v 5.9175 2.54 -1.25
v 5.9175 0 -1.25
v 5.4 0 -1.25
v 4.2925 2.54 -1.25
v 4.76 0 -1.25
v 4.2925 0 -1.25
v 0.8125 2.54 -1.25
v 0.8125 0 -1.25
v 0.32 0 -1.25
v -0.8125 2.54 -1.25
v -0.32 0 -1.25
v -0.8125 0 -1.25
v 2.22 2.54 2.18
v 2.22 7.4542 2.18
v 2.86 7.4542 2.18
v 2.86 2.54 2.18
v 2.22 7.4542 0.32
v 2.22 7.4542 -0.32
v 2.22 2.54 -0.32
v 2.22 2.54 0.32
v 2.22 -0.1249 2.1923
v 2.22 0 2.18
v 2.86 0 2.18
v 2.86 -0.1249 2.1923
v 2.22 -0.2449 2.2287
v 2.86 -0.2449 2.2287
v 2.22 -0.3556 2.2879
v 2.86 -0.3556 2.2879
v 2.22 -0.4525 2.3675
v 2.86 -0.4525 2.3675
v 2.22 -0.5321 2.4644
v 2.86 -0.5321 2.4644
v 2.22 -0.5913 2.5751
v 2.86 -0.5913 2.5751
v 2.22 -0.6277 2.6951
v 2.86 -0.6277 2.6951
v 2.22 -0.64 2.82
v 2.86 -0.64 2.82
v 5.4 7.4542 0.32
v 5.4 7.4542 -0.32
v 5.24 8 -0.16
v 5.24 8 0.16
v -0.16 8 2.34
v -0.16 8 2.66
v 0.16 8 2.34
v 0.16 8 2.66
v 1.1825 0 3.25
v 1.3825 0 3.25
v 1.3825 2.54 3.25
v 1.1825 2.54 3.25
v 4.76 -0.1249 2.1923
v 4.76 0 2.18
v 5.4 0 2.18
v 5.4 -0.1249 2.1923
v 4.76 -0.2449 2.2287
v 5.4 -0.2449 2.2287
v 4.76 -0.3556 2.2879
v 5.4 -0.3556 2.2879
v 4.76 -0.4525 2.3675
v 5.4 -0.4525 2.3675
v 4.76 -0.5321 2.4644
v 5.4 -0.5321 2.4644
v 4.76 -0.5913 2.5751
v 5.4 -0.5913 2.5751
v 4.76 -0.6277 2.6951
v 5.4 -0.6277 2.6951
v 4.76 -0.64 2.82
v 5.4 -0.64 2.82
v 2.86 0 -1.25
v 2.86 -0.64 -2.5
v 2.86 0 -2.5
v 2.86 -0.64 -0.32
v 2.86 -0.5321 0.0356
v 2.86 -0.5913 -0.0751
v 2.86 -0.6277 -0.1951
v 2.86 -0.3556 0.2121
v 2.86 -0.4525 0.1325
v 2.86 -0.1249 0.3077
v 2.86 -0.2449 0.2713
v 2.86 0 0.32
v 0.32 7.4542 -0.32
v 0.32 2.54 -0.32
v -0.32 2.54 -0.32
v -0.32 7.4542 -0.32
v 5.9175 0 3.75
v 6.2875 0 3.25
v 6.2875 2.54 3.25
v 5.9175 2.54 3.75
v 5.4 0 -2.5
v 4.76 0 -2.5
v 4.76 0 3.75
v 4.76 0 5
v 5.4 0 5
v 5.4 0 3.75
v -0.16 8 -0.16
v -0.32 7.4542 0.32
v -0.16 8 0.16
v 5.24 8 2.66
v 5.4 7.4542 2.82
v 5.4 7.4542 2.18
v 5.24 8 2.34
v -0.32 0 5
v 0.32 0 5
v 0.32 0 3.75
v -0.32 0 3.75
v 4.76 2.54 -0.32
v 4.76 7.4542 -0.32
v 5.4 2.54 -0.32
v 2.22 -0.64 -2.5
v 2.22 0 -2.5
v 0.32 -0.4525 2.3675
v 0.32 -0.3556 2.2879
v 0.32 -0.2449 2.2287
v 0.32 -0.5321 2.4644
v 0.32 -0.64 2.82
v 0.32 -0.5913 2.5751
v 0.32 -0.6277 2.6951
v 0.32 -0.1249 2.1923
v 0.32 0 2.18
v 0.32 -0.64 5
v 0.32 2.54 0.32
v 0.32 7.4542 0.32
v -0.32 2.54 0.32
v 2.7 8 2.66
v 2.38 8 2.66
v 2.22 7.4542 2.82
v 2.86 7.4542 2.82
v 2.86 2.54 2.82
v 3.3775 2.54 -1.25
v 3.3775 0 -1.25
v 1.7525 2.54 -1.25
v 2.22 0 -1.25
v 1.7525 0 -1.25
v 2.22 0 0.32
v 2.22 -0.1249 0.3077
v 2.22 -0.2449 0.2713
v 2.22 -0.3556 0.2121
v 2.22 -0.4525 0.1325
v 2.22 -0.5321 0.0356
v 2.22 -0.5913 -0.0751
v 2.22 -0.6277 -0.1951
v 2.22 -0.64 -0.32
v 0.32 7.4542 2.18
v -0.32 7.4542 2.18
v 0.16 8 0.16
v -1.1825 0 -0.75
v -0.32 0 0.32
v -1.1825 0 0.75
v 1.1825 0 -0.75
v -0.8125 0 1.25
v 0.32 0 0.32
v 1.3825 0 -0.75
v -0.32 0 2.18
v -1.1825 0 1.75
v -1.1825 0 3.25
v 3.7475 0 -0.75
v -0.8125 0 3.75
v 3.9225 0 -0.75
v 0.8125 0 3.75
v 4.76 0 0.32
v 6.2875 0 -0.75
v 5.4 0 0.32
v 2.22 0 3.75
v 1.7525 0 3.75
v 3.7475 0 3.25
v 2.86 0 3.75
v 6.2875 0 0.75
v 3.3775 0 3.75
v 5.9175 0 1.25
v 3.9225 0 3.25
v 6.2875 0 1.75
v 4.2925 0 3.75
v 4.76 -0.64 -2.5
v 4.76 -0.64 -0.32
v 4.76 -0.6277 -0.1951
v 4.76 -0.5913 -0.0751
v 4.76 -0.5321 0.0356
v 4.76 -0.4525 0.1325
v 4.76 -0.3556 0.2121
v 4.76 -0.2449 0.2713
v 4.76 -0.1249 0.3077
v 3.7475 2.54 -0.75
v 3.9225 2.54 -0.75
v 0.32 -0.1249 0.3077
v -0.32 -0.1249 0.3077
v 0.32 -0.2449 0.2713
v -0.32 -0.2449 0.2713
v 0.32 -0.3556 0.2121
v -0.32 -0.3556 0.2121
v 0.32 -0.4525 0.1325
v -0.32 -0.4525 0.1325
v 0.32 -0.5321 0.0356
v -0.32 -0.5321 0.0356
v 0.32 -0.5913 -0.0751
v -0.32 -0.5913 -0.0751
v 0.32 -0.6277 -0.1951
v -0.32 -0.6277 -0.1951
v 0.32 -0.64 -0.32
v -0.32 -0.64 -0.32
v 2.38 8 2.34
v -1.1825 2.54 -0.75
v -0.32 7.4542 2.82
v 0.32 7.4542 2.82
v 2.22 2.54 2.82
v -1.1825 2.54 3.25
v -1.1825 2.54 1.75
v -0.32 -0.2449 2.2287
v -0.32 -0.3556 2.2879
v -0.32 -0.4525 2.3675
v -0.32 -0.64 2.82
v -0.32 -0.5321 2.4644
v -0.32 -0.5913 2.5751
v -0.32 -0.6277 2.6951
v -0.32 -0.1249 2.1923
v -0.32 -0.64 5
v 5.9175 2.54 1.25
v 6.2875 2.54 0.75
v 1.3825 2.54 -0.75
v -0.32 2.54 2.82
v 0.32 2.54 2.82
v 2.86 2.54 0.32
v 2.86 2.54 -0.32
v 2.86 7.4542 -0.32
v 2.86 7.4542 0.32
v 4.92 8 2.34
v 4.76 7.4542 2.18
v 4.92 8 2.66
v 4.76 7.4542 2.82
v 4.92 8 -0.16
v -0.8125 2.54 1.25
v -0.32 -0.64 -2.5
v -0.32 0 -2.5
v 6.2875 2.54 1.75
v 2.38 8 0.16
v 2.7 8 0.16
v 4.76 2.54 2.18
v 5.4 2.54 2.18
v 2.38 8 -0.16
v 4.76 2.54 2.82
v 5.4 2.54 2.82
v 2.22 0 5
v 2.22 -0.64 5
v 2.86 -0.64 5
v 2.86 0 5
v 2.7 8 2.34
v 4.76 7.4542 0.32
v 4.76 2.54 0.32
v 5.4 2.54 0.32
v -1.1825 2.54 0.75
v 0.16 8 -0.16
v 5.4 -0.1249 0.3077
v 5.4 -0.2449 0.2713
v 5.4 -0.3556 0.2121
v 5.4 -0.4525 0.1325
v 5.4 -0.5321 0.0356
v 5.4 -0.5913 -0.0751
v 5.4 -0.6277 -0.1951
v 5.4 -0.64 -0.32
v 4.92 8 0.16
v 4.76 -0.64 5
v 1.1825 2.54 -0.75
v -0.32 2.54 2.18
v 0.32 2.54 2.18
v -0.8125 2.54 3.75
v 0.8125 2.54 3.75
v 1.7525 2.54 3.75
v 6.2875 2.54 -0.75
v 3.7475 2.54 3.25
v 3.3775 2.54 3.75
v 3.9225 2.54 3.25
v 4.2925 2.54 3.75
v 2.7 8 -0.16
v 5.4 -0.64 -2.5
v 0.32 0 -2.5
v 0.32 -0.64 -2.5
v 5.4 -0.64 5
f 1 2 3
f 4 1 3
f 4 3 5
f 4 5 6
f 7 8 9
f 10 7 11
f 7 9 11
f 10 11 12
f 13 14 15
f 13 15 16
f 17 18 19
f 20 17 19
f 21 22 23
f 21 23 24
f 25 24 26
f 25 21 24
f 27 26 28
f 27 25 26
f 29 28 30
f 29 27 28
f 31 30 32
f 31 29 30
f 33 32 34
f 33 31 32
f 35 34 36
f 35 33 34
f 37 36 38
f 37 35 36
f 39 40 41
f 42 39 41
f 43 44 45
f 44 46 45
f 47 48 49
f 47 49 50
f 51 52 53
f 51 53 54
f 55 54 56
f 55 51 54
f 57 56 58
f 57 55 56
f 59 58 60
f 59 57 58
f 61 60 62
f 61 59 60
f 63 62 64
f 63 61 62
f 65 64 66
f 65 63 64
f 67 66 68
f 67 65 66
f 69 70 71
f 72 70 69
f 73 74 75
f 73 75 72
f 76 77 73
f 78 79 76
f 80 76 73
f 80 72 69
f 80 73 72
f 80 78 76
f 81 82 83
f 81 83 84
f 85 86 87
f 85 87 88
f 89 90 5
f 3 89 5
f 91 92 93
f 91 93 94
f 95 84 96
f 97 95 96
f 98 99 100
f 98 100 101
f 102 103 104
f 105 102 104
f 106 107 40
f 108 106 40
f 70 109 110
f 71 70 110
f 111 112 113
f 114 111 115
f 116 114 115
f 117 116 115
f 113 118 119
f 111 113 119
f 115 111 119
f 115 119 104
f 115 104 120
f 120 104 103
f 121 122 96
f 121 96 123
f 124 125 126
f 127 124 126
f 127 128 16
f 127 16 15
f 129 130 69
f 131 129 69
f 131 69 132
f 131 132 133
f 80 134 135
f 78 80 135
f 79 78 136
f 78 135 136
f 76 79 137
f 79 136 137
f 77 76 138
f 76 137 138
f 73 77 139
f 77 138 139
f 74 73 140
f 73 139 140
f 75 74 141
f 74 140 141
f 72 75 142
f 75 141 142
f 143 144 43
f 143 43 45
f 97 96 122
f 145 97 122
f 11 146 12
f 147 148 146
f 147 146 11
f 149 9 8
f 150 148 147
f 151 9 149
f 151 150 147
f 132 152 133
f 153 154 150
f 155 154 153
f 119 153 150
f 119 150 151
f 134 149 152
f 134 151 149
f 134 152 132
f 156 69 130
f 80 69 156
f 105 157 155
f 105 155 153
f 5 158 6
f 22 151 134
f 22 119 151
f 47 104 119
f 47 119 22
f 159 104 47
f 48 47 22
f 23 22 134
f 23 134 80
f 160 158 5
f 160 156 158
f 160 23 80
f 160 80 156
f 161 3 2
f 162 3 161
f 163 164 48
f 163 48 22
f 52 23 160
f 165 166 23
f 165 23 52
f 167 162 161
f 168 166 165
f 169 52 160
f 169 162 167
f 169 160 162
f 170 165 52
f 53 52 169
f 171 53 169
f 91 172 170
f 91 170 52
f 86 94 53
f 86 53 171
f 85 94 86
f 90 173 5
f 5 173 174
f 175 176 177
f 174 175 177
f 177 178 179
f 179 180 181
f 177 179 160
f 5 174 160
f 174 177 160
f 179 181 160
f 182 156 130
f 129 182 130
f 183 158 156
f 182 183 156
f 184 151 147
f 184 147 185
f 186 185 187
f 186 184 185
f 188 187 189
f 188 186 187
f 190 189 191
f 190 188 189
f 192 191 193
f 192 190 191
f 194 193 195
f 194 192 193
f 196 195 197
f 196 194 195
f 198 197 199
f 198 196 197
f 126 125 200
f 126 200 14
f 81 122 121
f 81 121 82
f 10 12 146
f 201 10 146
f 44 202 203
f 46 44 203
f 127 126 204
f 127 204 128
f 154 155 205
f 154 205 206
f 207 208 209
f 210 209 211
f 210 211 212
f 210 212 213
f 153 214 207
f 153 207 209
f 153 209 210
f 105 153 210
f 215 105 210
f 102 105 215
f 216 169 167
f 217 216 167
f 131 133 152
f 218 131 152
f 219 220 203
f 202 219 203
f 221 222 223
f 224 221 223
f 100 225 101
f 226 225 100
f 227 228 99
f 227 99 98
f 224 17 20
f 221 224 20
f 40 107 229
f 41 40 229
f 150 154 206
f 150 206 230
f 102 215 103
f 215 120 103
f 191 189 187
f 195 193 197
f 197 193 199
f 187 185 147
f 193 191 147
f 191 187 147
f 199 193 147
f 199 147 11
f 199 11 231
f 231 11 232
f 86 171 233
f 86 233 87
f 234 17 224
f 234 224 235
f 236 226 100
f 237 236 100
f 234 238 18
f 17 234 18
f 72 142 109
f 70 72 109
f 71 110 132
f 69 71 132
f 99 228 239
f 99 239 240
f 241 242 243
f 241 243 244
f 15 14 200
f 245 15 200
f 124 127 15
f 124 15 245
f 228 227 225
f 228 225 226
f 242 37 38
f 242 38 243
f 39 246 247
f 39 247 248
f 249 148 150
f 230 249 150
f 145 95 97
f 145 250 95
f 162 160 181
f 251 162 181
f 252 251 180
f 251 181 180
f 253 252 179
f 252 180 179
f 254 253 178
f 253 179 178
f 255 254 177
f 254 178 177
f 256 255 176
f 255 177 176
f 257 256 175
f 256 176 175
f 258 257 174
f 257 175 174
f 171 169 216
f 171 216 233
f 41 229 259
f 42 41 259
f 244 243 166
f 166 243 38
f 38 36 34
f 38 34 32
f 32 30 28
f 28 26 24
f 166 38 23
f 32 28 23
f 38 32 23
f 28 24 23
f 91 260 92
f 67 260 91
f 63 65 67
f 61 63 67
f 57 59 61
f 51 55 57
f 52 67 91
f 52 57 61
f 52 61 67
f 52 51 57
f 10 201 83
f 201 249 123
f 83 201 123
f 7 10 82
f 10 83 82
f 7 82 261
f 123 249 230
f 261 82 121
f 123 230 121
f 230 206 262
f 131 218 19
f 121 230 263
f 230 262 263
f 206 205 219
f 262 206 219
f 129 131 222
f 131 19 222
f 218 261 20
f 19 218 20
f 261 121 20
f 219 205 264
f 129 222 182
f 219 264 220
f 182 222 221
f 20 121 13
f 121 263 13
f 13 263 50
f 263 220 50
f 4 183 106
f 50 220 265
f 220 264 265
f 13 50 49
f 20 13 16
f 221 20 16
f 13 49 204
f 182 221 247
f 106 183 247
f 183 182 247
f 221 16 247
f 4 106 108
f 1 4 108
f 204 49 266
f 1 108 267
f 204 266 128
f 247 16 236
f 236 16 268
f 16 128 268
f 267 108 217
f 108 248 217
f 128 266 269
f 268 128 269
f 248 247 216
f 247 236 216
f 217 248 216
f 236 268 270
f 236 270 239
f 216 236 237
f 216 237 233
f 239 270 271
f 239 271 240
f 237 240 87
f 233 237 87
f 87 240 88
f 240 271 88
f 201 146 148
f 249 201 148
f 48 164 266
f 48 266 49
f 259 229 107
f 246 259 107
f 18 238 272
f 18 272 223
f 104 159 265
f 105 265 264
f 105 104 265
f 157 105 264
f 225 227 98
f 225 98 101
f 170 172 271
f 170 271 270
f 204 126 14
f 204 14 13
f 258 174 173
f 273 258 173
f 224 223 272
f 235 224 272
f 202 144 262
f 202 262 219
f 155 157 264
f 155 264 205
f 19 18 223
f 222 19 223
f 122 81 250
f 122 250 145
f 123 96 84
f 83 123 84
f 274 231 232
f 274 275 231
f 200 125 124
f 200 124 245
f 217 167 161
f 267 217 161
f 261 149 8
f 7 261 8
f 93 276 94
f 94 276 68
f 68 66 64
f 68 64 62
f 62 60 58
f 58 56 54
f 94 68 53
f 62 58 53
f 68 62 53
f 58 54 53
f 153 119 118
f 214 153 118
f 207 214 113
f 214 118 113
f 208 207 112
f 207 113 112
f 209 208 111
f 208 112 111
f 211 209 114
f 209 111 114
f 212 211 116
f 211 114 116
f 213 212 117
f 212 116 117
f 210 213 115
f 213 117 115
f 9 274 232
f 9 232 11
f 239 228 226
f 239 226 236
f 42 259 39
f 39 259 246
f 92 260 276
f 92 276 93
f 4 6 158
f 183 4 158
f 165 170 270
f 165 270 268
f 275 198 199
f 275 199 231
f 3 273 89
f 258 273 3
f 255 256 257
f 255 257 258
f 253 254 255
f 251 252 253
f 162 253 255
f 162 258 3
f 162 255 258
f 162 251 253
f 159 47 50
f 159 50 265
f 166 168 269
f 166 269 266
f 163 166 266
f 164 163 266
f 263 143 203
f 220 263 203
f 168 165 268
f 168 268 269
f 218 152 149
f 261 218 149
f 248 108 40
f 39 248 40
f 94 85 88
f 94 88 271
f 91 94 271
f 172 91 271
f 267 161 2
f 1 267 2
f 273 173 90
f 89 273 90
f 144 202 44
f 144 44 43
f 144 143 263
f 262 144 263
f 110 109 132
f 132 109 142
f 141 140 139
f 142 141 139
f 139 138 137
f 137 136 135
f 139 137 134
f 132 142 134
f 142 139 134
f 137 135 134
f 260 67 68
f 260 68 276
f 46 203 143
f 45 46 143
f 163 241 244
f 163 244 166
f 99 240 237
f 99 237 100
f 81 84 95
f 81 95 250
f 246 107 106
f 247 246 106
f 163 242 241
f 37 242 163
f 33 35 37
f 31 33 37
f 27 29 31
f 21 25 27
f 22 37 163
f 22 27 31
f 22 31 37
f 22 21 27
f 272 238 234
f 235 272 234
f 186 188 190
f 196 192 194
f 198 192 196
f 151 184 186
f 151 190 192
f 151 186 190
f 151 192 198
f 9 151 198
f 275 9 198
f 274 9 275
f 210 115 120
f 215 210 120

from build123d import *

# Parameters (mm, degrees)
BOSS_EXTRUDE3_DEPTH = 2.54
BOSS_EXTRUDE4_DEPTH = 2.54
LPATTERN1_COUNT     = 2
LPATTERN1_PITCH     = 2.54
BOSS_EXTRUDE5_DEPTH = 0.32
CHAMFER1_SIZE       = 0.16
CHAMFER1_SIZE2      = 0.5458
LPATTERN2_START     = 2.38
LPATTERN2_DEPTH     = 0.32
LPATTERN2_START_2   = 4.92
LPATTERN2_2_DEPTH   = 0.32
LPATTERN2_START_3   = 2.22
LPATTERN2_3_DEPTH   = 0.64
LPATTERN2_START_4   = 4.76
LPATTERN2_4_DEPTH   = 0.64
LPATTERN2_START_5   = -0.32
LPATTERN2_5_DEPTH   = 0.64
LPATTERN2_START_6   = 1
LPATTERN2_6_DEPTH   = 5
SKETCH9_W           = 6.730038924
SKETCH9_H           = 1
BOSS_EXTRUDE6_DEPTH = 2.54


with BuildPart() as part:
    # Sketch6 → Boss-Extrude3 (new body)
    with BuildSketch(Plane(origin=(0, 0, 0), x_dir=(1, 0, 0), z_dir=(0, 1, 0))):
        Polygon((-1.1825, 0.75), (-1.1825, -0.75), (-0.812519462, -1.25), (0.812519462, -1.25), (1.1825, -0.75), (1.1825, 0.75), (0.812519462, 1.25), (-0.812519462, 1.25), align=None)
    extrude(amount=BOSS_EXTRUDE3_DEPTH)

    # Sketch7 → Boss-Extrude4 (add)
    with BuildSketch(Plane(origin=(0, 0, 0), x_dir=(1, 0, 0), z_dir=(0, 1, 0))):
        Polygon((1.1825, 0.75), (1.1825, -0.75), (1.3825, -0.75), (1.752480538, -1.25), (3.377519462, -1.25), (3.7475, -0.75), (3.7475, 0.75), (3.377519462, 1.25), (1.752480538, 1.25), (1.3825, 0.75), align=None)
    boss_extrude4 = extrude(amount=BOSS_EXTRUDE4_DEPTH)

    # LPattern1: Boss-Extrude4 ×2
    with Locations(*[(i * LPATTERN1_PITCH, 0, 0) for i in range(1, LPATTERN1_COUNT)]):
        add(boss_extrude4)

    # Sketch8 → Boss-Extrude5 (add, symmetric)
    with BuildSketch(Plane(origin=(0, 0, 0), x_dir=(0, 0, -1), z_dir=(1, 0, 0))):
        with BuildLine():
            Line((0.32, 0), (0.32, 8))
            Line((0.32, 8), (-0.32, 8))
            Line((-0.32, 8), (-0.32, 0))
            ThreePointArc((-0.32, 0), (-0.13254834, -0.45254834), (0.32, -0.64))
            Line((0.32, -0.64), (2.5, -0.64))
            Line((2.5, -0.64), (2.5, 0))
            Line((2.5, 0), (0.32, 0))
        make_face()
    extrude(amount=BOSS_EXTRUDE5_DEPTH, both=True)

    # Chamfer1
    chamfer1_edges = [part.edges().sort_by_distance(p)[0] for p in [
        (-0.32, 8, 0),
        (0, 8, -0.32),
        (0, 8, 0.32),
        (0.32, 8, 0),
    ]]
    chamfer1_side = [part.faces().sort_by_distance(p)[0] for p in [
        (0, 8, 0),
    ]]
    chamfer(chamfer1_edges, length=CHAMFER1_SIZE, length2=CHAMFER1_SIZE2, reference=chamfer1_side[0])

    # LPattern2: read off the stored shape, not the designer's step
    # LPattern2 outline → LPattern2 (add)
    with BuildSketch(Plane.YZ.offset(LPATTERN2_START)):
        with BuildLine():
            Line((-0.64, -0.32), (-0.64, -2.5))
            Line((-0.64, -2.5), (0, -2.5))
            Line((0, -2.5), (0, 0.32))
            ThreePointArc((0, 0.32), (-0.45254834, 0.13254834), (-0.64, -0.32))
        make_face()
        Polygon((2.54, -0.32), (7.4542, -0.32), (8, -0.16), (8, 0.16), (7.4542, 0.32), (2.54, 0.32), align=None)
    extrude(amount=LPATTERN2_DEPTH)

    # LPattern2 2 outline → LPattern2 2 (add)
    with BuildSketch(Plane.YZ.offset(LPATTERN2_START_2)):
        with BuildLine():
            Line((-0.64, -0.32), (-0.64, -2.5))
            Line((-0.64, -2.5), (0, -2.5))
            Line((0, -2.5), (0, 0.32))
            ThreePointArc((0, 0.32), (-0.45254834, 0.13254834), (-0.64, -0.32))
        make_face()
        Polygon((2.54, -0.32), (7.4542, -0.32), (8, -0.16), (8, 0.16), (7.4542, 0.32), (2.54, 0.32), align=None)
    extrude(amount=LPATTERN2_2_DEPTH)

    # LPattern2 3 outline → LPattern2 3 (add)
    with BuildSketch(Plane.YZ.offset(LPATTERN2_START_3)):
        with BuildLine():
            Line((-0.64, -0.32), (-0.64, -2.5))
            Line((-0.64, -2.5), (0, -2.5))
            Line((0, -2.5), (0, 0.32))
            ThreePointArc((0, 0.32), (-0.45254834, 0.13254834), (-0.64, -0.32))
        make_face()
    extrude(amount=LPATTERN2_3_DEPTH)

    # LPattern2 4 outline → LPattern2 4 (add)
    with BuildSketch(Plane.YZ.offset(LPATTERN2_START_4)):
        with BuildLine():
            Line((-0.64, -0.32), (-0.64, -2.5))
            Line((-0.64, -2.5), (0, -2.5))
            Line((0, -2.5), (0, 0.32))
            ThreePointArc((0, 0.32), (-0.45254834, 0.13254834), (-0.64, -0.32))
        make_face()
    extrude(amount=LPATTERN2_4_DEPTH)

    # LPattern2 5 outline → LPattern2 5 (add)
    with BuildSketch(Plane.XY.offset(LPATTERN2_START_5)):
        Polygon((5.24, 8), (5.24, 2.54), (5.4, 2.54), (5.4, 7.4542), align=None)
        Polygon((4.76, 7.4542), (4.76, 2.54), (4.92, 2.54), (4.92, 8), align=None)
        Polygon((2.7, 8), (2.7, 2.54), (2.86, 2.54), (2.86, 7.4542), align=None)
        Polygon((2.22, 7.4542), (2.22, 2.54), (2.38, 2.54), (2.38, 8), align=None)
    extrude(amount=LPATTERN2_5_DEPTH)

    # LPattern2 6 outline → LPattern2 6 (cut)
    with BuildSketch(Plane.YZ.offset(LPATTERN2_START_6)):
        Polygon((7.4542, 0.32), (8, 0.16), (8, 0.32), align=None)
        Polygon((7.4542, -0.32), (8, -0.32), (8, -0.16), align=None)
    extrude(amount=LPATTERN2_6_DEPTH, mode=Mode.SUBTRACT)

    # Mirror1: part across plane


with BuildPart() as part_1:
    add(part.part)
    add(part.part.mirror(Plane(origin=(-0.812519462, 2.54, 1.25), x_dir=(1, 0, 0), z_dir=(0, 0, -1))))

    # Sketch9 → Boss-Extrude6 (add)
    with BuildSketch(Plane.XZ):
        with Locations((2.5525, 1.25)):
            Rectangle(SKETCH9_W, SKETCH9_H)
    extrude(amount=-BOSS_EXTRUDE6_DEPTH)


solid = part_1.part
